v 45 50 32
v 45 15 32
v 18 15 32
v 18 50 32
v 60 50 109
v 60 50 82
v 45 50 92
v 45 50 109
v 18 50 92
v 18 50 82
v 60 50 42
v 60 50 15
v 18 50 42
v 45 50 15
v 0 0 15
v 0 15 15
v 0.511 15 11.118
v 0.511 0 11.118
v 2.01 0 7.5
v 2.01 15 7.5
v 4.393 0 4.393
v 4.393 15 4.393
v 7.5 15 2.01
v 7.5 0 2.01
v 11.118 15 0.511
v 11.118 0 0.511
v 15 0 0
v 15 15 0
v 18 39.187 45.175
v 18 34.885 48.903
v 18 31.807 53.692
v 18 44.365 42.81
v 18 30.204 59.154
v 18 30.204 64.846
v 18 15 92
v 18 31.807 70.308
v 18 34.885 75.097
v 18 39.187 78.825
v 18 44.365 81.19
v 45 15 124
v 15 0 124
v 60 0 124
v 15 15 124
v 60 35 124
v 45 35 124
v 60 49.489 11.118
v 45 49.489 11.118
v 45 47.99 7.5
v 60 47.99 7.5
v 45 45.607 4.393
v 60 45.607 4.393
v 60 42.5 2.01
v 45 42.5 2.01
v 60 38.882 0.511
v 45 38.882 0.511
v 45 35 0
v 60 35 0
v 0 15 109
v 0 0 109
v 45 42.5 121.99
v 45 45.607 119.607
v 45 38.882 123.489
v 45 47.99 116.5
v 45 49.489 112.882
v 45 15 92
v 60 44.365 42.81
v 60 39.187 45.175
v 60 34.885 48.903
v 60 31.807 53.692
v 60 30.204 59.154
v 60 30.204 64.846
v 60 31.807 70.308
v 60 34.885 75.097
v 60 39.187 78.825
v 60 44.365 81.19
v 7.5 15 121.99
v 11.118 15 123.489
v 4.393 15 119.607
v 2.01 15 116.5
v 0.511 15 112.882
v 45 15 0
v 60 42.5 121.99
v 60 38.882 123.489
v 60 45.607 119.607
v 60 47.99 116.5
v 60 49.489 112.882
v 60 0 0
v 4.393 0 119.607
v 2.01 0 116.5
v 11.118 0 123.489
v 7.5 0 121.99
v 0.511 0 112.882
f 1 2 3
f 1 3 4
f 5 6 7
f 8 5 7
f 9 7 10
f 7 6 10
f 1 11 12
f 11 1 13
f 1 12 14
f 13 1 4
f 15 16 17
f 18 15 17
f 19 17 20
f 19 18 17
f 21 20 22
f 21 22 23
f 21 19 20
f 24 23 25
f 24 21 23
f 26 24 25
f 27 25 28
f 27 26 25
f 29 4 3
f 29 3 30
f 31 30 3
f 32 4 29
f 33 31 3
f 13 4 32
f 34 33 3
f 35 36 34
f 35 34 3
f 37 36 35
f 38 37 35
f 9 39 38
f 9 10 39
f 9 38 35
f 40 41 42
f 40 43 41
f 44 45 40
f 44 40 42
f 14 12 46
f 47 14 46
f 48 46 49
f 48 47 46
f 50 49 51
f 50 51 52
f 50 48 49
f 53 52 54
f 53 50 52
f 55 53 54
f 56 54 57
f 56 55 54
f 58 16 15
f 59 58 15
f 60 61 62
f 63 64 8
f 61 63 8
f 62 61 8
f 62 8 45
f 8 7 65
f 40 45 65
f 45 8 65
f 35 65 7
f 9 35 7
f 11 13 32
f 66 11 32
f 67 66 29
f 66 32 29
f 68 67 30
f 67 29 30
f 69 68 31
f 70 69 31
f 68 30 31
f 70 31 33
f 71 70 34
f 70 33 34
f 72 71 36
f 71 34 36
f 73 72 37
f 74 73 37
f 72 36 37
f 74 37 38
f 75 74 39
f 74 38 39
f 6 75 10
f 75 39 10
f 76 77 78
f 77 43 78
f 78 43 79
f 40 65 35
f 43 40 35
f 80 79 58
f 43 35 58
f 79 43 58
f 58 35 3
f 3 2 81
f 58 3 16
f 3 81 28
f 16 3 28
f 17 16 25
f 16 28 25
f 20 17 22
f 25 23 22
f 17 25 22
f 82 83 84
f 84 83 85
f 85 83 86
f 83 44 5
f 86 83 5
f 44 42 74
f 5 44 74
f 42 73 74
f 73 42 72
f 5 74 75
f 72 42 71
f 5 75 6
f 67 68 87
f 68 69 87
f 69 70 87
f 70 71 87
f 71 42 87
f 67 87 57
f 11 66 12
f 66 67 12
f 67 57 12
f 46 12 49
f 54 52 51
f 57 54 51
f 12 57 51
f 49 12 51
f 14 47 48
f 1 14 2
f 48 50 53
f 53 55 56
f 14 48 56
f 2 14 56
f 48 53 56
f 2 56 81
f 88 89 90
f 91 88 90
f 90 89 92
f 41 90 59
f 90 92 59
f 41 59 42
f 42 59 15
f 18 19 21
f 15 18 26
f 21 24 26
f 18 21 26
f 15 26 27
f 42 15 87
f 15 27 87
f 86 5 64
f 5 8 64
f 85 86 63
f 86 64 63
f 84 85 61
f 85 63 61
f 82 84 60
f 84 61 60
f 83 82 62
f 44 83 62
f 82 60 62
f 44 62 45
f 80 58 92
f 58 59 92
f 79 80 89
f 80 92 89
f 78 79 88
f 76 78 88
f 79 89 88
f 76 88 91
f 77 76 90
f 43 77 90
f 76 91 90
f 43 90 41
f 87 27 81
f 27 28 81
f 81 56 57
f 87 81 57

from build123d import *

# Parameters (mm, degrees)
BOSS_EXTRUDE2_DEPTH = 124
FILLET1_R           = 15
FILLET2_R           = 15
SKETCH2_W           = 60
SKETCH2_H           = 35
BOSS_EXTRUDE3_DEPTH = 27
SKETCH5_R           = 20
CUT_EXTRUDE8_DEPTH  = 50


with BuildPart() as part:
    # Sketch1 → Boss-Extrude2 (new body)
    with BuildSketch(Plane.XY):
        Polygon((0, 0), (60, 0), (60, 50), (45, 50), (45, 15), (0, 15), align=None)
    extrude(amount=BOSS_EXTRUDE2_DEPTH)

    # Fillet1
    fillet1_edges = [part.edges().sort_by_distance(p)[0] for p in [
        (52.5, 50, 124),
        (0, 7.5, 124),
        (52.5, 50, 0),
    ]]
    fillet(fillet1_edges, radius=FILLET1_R)

    # Fillet2
    fillet2_edges = [part.edges().sort_by_distance(p)[0] for p in [
        (0, 7.5, 0),
    ]]
    fillet(fillet2_edges, radius=FILLET2_R)

    # Sketch2 → Boss-Extrude3 (add)
    with BuildSketch(Plane.ZY.offset(-45)):
        with Locations((62, 32.5)):
            Rectangle(SKETCH2_W, SKETCH2_H)
    extrude(amount=BOSS_EXTRUDE3_DEPTH)

    # Sketch5 → Cut-Extrude8 (cut)
    with BuildSketch(Plane.ZY.offset(-18)):
        with Locations((62, 50)):
            Circle(SKETCH5_R)
    extrude(amount=-CUT_EXTRUDE8_DEPTH, mode=Mode.SUBTRACT)


solid = part.part
